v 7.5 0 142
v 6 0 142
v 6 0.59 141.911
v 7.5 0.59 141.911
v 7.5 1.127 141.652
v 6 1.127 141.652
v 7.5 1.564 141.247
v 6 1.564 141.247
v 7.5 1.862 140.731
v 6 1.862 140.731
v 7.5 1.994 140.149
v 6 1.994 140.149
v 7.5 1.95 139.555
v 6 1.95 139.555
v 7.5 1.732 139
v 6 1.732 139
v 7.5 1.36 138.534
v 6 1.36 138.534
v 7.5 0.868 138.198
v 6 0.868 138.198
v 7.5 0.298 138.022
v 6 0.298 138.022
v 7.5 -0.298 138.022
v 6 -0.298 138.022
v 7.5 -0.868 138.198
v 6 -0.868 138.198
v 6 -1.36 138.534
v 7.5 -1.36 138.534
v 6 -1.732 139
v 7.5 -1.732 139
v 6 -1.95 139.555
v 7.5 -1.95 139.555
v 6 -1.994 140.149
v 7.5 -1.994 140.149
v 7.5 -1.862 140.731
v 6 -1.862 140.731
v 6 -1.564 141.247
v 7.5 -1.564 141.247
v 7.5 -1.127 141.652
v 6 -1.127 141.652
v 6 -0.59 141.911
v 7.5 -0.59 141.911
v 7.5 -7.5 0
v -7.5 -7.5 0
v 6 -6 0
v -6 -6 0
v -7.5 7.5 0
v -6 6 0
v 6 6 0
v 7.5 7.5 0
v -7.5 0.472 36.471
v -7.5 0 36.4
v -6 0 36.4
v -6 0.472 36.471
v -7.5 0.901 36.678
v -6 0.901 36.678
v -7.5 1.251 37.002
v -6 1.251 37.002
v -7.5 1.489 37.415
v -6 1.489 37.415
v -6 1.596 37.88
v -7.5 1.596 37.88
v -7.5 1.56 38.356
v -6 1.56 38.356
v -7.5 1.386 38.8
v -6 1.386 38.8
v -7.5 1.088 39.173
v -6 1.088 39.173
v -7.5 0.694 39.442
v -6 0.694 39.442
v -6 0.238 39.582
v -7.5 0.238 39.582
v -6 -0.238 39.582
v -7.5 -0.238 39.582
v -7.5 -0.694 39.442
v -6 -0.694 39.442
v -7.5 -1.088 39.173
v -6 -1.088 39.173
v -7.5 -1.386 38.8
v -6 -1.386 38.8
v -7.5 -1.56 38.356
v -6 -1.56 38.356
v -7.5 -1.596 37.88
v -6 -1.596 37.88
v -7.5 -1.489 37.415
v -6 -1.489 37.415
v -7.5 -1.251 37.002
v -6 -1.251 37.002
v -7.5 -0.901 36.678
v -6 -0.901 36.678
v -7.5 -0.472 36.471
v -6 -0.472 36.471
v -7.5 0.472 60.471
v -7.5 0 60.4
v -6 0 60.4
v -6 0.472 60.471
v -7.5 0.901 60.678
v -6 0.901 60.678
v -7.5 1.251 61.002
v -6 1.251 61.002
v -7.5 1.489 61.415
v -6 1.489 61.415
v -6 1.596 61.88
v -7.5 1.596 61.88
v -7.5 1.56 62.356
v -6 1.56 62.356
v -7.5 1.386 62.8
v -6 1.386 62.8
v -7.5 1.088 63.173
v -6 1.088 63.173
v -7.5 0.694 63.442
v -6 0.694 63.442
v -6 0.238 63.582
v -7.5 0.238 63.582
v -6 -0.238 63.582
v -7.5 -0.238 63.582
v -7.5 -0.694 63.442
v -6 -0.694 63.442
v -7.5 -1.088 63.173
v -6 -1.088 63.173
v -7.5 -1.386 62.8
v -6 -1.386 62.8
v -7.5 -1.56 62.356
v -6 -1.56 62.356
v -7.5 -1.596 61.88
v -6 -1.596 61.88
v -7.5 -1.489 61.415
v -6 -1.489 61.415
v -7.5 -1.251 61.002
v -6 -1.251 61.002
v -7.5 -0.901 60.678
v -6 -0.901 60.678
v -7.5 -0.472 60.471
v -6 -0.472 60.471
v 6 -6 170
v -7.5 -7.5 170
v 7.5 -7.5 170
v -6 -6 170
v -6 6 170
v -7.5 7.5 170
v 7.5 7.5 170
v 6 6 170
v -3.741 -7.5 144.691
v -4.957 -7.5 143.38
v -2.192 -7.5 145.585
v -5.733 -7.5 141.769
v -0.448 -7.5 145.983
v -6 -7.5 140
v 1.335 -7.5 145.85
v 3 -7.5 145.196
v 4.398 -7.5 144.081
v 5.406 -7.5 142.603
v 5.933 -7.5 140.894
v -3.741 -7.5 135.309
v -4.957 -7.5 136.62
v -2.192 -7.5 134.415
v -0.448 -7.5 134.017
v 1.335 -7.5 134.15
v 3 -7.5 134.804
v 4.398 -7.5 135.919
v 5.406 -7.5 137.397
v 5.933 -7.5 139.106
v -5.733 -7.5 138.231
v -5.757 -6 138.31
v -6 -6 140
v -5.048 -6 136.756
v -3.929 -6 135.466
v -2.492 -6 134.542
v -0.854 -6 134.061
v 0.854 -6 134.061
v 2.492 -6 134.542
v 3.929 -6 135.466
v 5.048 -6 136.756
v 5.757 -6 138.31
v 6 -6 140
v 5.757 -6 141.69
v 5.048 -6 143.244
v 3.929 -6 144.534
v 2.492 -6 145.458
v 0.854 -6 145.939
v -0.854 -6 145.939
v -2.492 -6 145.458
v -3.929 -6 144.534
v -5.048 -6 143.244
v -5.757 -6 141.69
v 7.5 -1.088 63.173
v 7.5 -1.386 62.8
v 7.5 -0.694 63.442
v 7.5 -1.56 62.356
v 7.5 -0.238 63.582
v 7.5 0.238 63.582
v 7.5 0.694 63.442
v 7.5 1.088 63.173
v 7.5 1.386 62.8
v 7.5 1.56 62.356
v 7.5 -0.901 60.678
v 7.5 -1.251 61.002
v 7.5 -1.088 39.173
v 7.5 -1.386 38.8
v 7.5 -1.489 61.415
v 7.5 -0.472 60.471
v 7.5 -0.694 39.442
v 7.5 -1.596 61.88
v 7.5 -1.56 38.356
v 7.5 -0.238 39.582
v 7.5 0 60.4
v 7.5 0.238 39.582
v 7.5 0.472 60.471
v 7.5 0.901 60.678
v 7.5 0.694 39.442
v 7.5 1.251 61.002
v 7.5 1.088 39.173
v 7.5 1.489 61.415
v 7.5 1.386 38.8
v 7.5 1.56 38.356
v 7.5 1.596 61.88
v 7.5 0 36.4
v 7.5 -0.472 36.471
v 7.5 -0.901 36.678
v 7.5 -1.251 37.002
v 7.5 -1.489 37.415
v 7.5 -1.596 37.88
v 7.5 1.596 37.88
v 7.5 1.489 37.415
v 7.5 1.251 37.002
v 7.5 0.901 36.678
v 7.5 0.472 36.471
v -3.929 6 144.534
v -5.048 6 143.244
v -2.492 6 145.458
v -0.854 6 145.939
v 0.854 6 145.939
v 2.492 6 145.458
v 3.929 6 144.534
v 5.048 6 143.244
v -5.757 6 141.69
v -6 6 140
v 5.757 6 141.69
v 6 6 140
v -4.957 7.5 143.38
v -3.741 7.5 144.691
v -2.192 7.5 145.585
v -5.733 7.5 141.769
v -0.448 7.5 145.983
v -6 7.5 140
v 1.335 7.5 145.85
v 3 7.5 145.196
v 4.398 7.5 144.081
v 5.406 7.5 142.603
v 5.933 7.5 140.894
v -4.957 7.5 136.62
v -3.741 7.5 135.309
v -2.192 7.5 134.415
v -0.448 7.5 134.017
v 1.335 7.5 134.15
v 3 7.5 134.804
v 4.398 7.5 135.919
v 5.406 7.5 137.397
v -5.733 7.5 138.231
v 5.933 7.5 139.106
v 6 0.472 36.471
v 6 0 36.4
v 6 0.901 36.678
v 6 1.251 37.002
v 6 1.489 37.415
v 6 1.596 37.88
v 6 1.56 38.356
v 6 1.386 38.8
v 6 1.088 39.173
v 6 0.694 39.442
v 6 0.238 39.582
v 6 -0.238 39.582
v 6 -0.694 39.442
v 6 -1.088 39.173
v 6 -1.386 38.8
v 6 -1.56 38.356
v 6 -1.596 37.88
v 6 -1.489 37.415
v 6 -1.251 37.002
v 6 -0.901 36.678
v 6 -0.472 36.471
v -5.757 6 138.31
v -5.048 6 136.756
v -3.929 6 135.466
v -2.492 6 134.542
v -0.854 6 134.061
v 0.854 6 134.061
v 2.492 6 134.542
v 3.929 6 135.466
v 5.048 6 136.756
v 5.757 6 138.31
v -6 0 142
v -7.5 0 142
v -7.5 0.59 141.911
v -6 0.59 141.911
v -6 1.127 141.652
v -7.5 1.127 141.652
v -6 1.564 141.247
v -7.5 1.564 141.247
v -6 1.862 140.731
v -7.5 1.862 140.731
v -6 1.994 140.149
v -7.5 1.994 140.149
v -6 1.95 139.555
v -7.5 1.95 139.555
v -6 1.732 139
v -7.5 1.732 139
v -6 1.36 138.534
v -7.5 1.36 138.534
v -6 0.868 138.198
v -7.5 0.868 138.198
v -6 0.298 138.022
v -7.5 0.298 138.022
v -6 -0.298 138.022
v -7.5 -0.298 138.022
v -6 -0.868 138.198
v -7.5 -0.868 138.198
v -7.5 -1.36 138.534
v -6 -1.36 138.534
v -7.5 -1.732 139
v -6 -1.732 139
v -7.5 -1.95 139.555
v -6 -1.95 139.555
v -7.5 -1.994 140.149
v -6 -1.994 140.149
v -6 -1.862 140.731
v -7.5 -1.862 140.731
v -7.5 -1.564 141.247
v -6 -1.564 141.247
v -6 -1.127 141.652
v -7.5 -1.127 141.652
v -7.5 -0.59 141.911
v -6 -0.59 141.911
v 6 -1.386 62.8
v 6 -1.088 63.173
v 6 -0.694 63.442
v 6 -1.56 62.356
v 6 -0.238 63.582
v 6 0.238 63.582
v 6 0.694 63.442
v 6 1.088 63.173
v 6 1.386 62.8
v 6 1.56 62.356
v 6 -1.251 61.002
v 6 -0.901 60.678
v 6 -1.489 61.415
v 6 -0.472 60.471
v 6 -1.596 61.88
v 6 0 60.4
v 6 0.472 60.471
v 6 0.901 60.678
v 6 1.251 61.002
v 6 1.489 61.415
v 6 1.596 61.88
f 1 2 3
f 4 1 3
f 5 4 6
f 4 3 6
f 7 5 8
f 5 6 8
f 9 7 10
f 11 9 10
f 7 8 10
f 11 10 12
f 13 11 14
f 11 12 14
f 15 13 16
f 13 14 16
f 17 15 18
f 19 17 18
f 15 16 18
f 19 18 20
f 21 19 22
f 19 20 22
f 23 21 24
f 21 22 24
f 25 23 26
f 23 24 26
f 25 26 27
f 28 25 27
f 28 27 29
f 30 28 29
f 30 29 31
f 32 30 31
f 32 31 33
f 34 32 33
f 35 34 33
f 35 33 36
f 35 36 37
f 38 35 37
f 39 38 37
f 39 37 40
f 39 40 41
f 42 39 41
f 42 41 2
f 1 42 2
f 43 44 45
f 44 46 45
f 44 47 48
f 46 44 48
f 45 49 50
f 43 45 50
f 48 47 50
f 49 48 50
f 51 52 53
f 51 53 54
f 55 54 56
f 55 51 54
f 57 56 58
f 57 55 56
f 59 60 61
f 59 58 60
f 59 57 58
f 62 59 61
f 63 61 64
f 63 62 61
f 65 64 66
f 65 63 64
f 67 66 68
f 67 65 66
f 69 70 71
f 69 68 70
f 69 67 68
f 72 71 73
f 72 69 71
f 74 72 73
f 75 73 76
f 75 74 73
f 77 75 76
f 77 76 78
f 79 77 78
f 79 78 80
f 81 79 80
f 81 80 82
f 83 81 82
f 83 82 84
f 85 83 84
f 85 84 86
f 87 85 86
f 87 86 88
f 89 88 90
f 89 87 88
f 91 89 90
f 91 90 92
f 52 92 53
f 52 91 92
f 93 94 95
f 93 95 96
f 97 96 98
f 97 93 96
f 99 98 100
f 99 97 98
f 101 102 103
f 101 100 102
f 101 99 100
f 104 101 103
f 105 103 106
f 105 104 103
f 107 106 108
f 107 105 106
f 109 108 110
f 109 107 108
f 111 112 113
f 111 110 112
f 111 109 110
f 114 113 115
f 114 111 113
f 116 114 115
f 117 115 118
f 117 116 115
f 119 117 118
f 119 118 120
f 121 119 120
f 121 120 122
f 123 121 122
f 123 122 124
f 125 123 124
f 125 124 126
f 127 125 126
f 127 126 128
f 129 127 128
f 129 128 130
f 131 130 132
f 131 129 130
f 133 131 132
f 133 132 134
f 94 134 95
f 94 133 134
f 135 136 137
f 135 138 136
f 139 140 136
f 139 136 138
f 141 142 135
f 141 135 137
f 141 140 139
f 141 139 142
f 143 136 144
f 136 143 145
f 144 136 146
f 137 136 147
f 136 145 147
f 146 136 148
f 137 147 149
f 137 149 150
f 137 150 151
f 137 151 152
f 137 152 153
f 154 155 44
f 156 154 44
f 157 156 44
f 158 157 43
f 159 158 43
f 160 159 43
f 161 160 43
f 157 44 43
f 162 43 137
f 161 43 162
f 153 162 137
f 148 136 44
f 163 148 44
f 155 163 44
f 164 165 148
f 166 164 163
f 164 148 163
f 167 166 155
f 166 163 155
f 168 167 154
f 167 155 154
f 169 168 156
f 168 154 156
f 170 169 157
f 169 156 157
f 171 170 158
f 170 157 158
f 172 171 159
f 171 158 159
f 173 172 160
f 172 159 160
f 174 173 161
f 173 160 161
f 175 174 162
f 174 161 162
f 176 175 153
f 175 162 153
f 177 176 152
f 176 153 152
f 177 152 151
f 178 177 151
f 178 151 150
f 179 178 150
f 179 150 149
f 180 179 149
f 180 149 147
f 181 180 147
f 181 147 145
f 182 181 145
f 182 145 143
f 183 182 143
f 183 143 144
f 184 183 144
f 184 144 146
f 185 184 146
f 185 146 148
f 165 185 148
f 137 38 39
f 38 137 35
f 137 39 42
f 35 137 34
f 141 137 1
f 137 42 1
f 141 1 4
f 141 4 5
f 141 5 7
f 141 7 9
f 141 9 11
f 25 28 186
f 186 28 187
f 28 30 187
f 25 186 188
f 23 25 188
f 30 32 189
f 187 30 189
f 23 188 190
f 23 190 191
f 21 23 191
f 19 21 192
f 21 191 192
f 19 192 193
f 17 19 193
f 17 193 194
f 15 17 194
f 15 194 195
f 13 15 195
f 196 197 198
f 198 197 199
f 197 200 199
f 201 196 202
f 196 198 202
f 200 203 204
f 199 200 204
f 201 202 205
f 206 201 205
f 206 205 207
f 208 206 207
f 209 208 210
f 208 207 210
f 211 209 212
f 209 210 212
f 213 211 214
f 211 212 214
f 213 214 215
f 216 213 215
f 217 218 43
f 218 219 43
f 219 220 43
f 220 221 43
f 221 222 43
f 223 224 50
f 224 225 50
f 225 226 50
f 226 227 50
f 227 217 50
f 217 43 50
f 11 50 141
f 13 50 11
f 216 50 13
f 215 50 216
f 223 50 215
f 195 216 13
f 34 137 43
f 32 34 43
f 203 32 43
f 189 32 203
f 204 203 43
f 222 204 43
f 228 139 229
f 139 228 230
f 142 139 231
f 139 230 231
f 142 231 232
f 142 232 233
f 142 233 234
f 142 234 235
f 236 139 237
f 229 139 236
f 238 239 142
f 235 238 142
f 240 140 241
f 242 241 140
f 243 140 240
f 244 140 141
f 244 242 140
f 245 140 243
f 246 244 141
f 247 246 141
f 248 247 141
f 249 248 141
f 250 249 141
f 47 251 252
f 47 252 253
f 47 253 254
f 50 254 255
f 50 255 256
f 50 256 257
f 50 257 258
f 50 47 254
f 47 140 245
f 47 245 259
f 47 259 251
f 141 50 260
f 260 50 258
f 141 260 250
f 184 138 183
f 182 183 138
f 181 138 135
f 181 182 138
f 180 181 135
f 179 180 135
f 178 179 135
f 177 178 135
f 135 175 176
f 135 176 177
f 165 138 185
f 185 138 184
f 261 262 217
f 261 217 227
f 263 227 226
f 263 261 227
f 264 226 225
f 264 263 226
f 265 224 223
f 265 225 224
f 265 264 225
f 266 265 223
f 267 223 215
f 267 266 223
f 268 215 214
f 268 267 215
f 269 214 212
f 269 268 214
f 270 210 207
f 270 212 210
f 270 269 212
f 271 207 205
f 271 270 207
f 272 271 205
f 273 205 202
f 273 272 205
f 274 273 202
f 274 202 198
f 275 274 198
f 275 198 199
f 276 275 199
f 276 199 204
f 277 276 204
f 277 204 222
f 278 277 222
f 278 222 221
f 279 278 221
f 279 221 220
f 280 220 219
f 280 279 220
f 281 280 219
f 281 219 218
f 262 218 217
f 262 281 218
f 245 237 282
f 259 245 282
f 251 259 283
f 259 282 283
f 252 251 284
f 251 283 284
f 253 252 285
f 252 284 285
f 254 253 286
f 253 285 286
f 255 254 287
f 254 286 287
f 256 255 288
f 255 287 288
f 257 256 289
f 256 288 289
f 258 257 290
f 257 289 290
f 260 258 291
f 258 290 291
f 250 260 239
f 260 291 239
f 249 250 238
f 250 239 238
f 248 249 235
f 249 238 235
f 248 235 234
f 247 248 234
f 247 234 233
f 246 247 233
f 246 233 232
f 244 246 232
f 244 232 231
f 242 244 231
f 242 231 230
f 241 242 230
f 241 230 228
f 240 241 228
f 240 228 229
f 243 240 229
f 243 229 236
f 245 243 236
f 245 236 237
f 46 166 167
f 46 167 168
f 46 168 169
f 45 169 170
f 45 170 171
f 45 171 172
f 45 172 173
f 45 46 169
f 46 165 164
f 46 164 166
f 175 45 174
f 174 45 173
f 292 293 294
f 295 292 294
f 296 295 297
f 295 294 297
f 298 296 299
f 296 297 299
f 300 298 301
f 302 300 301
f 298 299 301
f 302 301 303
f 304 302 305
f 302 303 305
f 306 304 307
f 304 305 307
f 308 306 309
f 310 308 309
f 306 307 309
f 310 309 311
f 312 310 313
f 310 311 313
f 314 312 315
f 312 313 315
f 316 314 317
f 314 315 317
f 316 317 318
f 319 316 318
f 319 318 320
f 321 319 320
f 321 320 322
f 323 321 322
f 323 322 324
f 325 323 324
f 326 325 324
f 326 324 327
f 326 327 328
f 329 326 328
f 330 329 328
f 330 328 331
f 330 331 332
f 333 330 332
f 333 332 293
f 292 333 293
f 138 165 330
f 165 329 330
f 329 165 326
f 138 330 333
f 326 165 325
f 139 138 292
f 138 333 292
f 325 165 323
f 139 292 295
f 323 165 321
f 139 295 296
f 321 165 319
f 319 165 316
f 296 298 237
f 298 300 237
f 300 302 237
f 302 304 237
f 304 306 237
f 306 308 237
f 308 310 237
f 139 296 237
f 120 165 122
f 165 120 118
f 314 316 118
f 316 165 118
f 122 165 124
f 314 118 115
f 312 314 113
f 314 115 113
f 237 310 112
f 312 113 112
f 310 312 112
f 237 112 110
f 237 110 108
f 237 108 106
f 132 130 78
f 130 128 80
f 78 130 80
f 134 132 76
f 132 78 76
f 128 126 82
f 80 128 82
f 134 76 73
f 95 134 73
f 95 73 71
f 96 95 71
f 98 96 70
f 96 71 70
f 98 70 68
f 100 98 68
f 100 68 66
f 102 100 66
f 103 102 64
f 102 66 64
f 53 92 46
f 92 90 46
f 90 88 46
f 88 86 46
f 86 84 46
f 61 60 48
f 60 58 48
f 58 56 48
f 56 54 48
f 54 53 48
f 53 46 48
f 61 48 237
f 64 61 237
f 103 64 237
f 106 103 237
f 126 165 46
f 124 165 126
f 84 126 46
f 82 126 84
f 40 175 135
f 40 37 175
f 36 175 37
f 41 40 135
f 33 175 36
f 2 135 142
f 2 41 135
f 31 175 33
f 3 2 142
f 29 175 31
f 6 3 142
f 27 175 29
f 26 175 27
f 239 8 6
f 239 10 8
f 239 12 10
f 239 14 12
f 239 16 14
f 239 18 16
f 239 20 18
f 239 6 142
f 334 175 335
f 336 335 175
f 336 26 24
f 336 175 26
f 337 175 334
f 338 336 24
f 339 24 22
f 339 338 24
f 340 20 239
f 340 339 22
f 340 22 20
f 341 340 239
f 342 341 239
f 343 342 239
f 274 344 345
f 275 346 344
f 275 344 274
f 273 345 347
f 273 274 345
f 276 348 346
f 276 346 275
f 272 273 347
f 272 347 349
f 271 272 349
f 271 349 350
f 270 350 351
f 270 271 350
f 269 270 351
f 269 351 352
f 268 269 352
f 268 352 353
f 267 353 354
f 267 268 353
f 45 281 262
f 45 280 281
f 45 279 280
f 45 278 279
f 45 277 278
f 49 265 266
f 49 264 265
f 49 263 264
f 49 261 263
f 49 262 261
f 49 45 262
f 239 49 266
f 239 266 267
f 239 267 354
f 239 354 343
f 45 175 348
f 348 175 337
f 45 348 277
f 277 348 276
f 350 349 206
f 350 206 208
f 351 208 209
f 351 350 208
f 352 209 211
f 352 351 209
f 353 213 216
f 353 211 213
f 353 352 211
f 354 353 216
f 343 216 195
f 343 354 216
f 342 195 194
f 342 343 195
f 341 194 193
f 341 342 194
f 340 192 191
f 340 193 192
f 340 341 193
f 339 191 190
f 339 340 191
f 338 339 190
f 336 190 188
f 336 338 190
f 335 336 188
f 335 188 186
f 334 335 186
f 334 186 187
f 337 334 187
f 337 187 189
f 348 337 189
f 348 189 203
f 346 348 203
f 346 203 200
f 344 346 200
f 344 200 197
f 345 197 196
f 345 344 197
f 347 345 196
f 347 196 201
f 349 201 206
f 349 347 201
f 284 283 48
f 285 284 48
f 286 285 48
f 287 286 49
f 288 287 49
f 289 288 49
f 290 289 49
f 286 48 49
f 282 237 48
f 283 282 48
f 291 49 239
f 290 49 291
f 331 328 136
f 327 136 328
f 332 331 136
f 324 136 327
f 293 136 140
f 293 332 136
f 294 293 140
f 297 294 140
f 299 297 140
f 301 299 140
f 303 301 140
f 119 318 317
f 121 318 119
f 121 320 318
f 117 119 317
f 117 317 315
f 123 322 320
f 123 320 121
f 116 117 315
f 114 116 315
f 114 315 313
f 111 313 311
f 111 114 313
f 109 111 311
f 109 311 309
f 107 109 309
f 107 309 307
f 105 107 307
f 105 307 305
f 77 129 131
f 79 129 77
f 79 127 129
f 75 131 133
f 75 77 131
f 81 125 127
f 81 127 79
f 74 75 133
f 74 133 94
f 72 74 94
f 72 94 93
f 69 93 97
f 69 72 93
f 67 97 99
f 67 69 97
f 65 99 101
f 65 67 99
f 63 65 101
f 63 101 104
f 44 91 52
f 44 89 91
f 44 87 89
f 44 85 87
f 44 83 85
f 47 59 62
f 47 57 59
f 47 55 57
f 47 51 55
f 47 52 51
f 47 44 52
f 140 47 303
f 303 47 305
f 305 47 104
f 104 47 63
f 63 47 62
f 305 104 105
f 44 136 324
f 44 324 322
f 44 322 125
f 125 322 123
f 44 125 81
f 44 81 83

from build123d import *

# Parameters (mm, degrees)
SKETCH_1_W               = 15
SKETCH_1_H               = 15
SKETCH_1_W_2             = 12
SKETCH_1_H_2             = 12
EXTRUDE_1_DEPTH          = 160
SKETCH_3_R               = 6
CUT_EXTRUDE_3_DEPTH      = 161.876505432
SKETCH_7_R               = 2
CUT_EXTRUDE_4_DEPTH      = 161.876505432
CUT_EXTRUDE_5_DEPTH      = 161.876505432
CUT_EXTRUDE_5_DEPTH_BACK = 161.876505432
SKETCH_12_R              = 1.6
SKETCH_13_W              = 15
SKETCH_13_H              = 15
SKETCH_13_W_2            = 12
SKETCH_13_H_2            = 12
EXTRUDE_1_2_DEPTH        = 10


with BuildPart() as part:
    # ｽｹｯﾁ1 → Extrude 1 (new body)
    with BuildSketch(Plane.XY):
        Rectangle(SKETCH_1_W, SKETCH_1_H)
        Rectangle(SKETCH_1_W_2, SKETCH_1_H_2, mode=Mode.SUBTRACT)
    extrude(amount=EXTRUDE_1_DEPTH)

    # ｽｹｯﾁ3 → ｶｯﾄ - 押し出し3 (cut, through all)
    with BuildSketch(Plane.XZ.offset(7.5)):
        with Locations(Location((0, 140, 0), (0, 0, 180))):
            Circle(SKETCH_3_R)
    extrude(amount=-CUT_EXTRUDE_3_DEPTH, mode=Mode.SUBTRACT)

    # ｽｹｯﾁ7 → ｶｯﾄ - 押し出し4 (cut, through all)
    with BuildSketch(Plane.ZY.offset(7.5)):
        with Locations((140, 0)):
            Circle(SKETCH_7_R)
    extrude(amount=-CUT_EXTRUDE_4_DEPTH, mode=Mode.SUBTRACT)

    # ｽｹｯﾁ12 → ｶｯﾄ - 押し出し5 (cut, two sides: drawn at the far end of the back side and taken through both)
    with BuildSketch(Plane(origin=(7.5, 0, 0), x_dir=(0, 0, -1), z_dir=(1, 0, 0)).offset(-CUT_EXTRUDE_5_DEPTH_BACK)):
        with Locations((-38, 0)):
            Circle(SKETCH_12_R)
        with Locations((-62, 0)):
            Circle(SKETCH_12_R)
    extrude(amount=CUT_EXTRUDE_5_DEPTH + CUT_EXTRUDE_5_DEPTH_BACK, mode=Mode.SUBTRACT)

    # ｽｹｯﾁ13 → Extrude 1 2 (add)
    with BuildSketch(Plane.XY.offset(160)):
        Rectangle(SKETCH_13_W, SKETCH_13_H)
        Rectangle(SKETCH_13_W_2, SKETCH_13_H_2, mode=Mode.SUBTRACT)
    extrude(amount=EXTRUDE_1_2_DEPTH)


solid = part.part
